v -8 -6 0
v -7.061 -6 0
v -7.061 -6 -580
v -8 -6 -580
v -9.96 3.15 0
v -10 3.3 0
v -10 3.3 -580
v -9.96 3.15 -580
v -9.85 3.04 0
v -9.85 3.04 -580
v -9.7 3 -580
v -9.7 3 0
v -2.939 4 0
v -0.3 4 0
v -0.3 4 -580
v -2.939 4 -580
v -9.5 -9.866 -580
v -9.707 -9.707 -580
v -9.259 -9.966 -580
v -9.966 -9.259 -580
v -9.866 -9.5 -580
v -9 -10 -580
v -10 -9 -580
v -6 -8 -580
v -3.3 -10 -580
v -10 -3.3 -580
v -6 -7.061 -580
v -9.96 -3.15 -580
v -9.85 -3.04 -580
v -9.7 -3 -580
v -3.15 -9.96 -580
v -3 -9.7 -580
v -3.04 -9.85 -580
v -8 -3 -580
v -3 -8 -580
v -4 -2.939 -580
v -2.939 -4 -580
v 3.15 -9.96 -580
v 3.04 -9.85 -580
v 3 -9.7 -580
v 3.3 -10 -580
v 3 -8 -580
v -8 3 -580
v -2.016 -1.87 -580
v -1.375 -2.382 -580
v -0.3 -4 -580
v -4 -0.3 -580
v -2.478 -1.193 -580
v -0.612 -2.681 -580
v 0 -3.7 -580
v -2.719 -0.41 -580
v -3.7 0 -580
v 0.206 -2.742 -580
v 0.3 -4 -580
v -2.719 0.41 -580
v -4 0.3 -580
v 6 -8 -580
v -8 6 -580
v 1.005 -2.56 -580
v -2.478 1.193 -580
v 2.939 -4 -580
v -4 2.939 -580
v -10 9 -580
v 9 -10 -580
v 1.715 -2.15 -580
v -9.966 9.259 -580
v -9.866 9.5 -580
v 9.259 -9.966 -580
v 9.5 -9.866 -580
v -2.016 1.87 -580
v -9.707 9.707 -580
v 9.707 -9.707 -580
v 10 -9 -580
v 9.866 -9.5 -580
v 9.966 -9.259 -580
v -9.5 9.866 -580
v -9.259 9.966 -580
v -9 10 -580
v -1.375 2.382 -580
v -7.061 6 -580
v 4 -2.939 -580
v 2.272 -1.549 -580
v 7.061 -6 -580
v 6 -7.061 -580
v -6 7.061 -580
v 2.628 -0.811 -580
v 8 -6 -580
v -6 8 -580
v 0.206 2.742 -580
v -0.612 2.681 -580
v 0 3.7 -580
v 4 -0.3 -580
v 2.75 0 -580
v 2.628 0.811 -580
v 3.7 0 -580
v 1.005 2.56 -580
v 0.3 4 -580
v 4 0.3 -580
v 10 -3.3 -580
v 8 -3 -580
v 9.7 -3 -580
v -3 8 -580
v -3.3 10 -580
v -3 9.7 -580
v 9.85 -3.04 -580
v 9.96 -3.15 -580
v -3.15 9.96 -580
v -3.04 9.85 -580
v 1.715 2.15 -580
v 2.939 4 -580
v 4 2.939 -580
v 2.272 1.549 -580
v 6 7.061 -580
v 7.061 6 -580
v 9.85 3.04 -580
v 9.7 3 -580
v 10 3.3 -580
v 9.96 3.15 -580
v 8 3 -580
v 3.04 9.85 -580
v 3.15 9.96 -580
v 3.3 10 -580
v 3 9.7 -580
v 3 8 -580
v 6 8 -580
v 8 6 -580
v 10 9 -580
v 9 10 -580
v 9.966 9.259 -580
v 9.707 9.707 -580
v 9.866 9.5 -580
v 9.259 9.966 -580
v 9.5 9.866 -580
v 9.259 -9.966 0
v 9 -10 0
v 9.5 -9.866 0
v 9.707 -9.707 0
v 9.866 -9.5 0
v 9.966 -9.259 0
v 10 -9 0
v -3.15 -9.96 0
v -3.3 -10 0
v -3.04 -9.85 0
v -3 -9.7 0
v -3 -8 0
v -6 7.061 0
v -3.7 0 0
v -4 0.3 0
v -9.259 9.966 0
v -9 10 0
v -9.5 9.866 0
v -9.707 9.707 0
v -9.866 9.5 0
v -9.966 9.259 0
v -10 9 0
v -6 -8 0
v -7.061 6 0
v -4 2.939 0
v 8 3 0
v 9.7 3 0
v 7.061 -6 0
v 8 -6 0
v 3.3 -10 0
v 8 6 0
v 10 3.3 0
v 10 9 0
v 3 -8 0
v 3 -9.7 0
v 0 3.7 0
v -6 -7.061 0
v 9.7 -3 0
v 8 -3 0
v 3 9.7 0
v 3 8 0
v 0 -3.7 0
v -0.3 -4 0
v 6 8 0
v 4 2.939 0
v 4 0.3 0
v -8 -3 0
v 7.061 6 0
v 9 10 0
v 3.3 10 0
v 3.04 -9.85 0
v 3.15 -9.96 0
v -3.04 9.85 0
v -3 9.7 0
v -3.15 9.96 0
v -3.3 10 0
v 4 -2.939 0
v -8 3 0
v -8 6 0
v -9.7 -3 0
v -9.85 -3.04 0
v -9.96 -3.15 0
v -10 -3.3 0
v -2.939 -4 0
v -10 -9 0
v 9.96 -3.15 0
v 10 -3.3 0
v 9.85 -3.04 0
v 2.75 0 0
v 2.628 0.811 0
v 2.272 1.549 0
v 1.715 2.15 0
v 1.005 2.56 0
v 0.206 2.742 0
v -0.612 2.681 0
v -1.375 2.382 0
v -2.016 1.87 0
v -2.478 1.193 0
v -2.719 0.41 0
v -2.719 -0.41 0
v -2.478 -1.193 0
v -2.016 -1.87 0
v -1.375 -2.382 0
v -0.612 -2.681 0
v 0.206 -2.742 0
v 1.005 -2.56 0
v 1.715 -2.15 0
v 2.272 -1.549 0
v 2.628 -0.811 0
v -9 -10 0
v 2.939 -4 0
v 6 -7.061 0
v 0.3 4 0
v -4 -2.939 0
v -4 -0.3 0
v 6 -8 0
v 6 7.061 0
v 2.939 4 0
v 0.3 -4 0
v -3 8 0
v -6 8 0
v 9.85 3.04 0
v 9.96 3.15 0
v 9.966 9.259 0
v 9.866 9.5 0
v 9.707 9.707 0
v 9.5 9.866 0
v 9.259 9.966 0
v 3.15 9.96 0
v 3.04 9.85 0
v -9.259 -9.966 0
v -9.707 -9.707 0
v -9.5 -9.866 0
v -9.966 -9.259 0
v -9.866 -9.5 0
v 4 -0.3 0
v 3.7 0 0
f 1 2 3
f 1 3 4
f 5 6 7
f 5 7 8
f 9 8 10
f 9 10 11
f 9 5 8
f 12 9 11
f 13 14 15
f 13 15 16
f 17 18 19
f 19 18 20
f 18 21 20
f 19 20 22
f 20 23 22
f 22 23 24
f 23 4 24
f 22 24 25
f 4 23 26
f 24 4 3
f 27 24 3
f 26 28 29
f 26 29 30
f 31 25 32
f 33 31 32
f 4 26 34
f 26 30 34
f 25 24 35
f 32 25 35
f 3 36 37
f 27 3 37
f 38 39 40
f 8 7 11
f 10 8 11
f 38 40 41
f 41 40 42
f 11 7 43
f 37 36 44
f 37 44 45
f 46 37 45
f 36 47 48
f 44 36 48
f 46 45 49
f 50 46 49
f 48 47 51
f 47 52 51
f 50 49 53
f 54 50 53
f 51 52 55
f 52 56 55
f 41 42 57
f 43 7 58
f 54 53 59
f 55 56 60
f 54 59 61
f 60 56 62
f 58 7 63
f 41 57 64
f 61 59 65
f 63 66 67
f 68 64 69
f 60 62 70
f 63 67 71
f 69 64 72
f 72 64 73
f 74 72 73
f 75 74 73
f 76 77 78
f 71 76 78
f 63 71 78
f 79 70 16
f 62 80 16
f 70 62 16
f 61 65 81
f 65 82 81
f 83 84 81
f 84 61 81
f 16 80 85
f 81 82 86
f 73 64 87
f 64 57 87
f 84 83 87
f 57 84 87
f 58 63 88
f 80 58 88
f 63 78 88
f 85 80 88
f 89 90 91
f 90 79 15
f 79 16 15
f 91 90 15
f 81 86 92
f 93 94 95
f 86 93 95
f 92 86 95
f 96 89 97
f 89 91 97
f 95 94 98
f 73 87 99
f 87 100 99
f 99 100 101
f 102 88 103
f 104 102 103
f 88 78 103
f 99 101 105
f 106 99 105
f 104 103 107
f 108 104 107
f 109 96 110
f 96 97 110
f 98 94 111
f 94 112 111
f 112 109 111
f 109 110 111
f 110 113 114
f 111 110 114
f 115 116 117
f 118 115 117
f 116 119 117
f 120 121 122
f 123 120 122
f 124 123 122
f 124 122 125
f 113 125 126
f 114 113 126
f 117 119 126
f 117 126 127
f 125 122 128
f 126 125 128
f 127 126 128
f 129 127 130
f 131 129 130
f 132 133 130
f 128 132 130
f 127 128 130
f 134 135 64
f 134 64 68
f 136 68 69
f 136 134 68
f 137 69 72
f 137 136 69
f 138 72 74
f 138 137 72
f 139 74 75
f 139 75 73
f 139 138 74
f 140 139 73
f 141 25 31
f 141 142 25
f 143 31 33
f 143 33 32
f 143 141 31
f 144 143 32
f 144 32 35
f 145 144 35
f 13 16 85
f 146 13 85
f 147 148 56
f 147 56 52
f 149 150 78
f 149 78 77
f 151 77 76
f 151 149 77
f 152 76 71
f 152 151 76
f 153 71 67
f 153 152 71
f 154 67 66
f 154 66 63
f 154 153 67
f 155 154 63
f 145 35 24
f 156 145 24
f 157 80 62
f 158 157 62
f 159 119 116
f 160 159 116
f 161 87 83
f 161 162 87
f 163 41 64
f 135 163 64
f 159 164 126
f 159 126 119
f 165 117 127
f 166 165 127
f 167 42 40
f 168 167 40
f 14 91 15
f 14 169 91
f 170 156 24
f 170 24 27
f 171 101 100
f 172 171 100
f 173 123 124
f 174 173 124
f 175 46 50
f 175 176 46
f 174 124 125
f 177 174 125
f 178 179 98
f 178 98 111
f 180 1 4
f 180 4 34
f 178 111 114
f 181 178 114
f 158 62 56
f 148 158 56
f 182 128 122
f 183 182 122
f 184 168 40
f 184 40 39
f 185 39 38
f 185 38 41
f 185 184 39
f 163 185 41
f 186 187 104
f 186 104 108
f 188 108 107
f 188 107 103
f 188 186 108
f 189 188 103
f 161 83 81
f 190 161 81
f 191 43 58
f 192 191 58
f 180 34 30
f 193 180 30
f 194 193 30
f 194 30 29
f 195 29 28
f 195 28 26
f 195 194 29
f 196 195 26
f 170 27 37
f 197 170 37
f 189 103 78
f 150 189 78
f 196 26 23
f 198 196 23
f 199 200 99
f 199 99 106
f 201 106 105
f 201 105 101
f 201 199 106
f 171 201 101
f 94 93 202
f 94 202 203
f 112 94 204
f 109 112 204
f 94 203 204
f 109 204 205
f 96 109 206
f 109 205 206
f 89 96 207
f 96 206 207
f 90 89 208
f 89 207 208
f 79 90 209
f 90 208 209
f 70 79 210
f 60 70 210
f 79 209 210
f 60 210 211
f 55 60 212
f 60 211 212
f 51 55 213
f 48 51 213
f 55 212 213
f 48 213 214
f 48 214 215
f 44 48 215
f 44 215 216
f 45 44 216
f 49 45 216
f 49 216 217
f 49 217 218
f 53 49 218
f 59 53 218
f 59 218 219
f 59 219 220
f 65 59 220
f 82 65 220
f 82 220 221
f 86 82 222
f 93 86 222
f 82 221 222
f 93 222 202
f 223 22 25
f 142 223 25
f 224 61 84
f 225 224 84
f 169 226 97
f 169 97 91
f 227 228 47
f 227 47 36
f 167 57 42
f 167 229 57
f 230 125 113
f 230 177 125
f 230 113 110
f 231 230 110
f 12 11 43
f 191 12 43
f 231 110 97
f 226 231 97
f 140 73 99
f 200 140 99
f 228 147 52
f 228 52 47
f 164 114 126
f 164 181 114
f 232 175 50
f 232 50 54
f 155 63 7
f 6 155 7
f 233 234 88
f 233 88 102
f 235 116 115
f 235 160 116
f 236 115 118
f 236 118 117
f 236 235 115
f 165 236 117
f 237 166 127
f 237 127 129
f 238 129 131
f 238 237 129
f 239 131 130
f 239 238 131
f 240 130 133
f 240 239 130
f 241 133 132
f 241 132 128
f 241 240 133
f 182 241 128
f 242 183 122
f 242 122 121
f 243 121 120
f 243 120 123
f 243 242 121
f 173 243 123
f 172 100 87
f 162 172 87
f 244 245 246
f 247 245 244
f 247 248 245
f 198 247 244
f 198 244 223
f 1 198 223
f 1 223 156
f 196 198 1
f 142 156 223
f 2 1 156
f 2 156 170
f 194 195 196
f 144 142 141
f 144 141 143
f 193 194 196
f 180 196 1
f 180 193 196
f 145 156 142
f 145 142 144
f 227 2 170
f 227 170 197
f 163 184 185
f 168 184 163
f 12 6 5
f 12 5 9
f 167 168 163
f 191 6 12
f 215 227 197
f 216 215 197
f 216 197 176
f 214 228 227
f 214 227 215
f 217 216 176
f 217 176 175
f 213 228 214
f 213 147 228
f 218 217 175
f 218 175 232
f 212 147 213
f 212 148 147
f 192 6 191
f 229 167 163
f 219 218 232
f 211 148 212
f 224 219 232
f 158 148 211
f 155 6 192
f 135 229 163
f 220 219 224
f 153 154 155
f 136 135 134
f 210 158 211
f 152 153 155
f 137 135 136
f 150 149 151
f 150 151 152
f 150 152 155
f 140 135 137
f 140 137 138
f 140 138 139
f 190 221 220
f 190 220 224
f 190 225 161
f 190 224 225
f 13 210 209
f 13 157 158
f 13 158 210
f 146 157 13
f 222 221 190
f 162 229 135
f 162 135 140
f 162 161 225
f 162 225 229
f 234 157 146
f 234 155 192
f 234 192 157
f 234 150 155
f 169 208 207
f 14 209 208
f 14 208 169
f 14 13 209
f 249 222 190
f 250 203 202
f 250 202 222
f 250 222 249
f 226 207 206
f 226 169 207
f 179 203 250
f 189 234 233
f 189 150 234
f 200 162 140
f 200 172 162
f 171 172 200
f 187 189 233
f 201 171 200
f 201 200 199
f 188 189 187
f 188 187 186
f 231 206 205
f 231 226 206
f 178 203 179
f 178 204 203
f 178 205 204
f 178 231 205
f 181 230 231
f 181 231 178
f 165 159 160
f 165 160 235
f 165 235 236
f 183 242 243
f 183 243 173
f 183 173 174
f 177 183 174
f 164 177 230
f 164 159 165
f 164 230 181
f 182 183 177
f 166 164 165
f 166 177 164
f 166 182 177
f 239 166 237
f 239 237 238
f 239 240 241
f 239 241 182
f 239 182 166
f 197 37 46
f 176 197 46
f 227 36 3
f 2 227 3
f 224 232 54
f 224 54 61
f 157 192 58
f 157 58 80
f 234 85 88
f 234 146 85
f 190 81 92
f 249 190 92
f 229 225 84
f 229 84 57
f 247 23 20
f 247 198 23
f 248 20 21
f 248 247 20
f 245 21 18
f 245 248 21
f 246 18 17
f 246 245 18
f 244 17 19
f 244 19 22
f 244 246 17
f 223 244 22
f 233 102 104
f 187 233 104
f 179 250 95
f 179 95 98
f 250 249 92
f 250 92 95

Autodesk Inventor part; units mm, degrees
ref_plane "YZ Plane" through (0, 0, 0) normal (1, 0, 0) x (0, 1, 0)
ref_plane "XZ Plane" through (0, 0, 0) normal (0, 1, 0) x (-1, 0, 0)
ref_plane "XY Plane" through (0, 0, 0) normal (0, 0, 1) x (1, 0, 0)
sketch "Sketch_5" plane through (0, 0, 0) normal (0, 0, 1) x (1, 0, 0)
  line L0 (-10, 9) -> (-10, 3.3)
  arc A0 (-10, 3.3) -> (-9.7, 3) centre (-9.7, 3.3) ccw
  line L1 (-9.7, 3) -> (-8, 3)
  line L2 (-8, 3) -> (-8, 6)
  line L3 (-8, 6) -> (-7.0607, 6)
  line L4 (-7.0607, 6) -> (-4, 2.9393)
  line L5 (-4, 2.9393) -> (-4, 0.3)
  line L6 (-4, 0.3) -> (-3.7, 0)
  line L7 (-3.7, 0) -> (-4, -0.3)
  line L8 (-4, -0.3) -> (-4, -2.9393)
  line L9 (-4, -2.9393) -> (-7.0607, -6)
  line L10 (-7.0607, -6) -> (-8, -6)
  line L11 (-8, -6) -> (-8, -3)
  line L12 (-8, -3) -> (-9.7, -3)
  arc A1 (-9.7, -3) -> (-10, -3.3) centre (-9.7, -3.3) ccw
  line L13 (-10, -3.3) -> (-10, -9)
  arc A2 (-10, -9) -> (-9, -10) centre (-9, -9) ccw
  line L14 (-9, -10) -> (-3.3, -10)
  arc A3 (-3.3, -10) -> (-3, -9.7) centre (-3.3, -9.7) ccw
  line L15 (-3, -9.7) -> (-3, -8)
  line L16 (-3, -8) -> (-6, -8)
  line L17 (-6, -8) -> (-6, -7.0607)
  line L18 (-6, -7.0607) -> (-2.9393, -4)
  line L19 (-2.9393, -4) -> (-0.3, -4)
  line L20 (-0.3, -4) -> (0, -3.7)
  line L21 (0, -3.7) -> (0.3, -4)
  line L22 (0.3, -4) -> (2.9393, -4)
  line L23 (2.9393, -4) -> (6, -7.0607)
  line L24 (6, -7.0607) -> (6, -8)
  line L25 (6, -8) -> (3, -8)
  line L26 (3, -8) -> (3, -9.7)
  arc A4 (3, -9.7) -> (3.3, -10) centre (3.3, -9.7) ccw
  line L27 (3.3, -10) -> (9, -10)
  arc A5 (9, -10) -> (10, -9) centre (9, -9) ccw
  line L28 (10, -9) -> (10, -3.3)
  arc A6 (10, -3.3) -> (9.7, -3) centre (9.7, -3.3) ccw
  line L29 (9.7, -3) -> (8, -3)
  line L30 (8, -3) -> (8, -6)
  line L31 (8, -6) -> (7.0607, -6)
  line L32 (7.0607, -6) -> (4, -2.9393)
  line L33 (4, -2.9393) -> (4, -0.3)
  line L34 (4, -0.3) -> (3.7, 0)
  line L35 (3.7, 0) -> (4, 0.3)
  line L36 (4, 0.3) -> (4, 2.9393)
  line L37 (4, 2.9393) -> (7.0607, 6)
  line L38 (7.0607, 6) -> (8, 6)
  line L39 (8, 6) -> (8, 3)
  line L40 (8, 3) -> (9.7, 3)
  arc A7 (9.7, 3) -> (10, 3.3) centre (9.7, 3.3) ccw
  line L41 (10, 3.3) -> (10, 9)
  arc A8 (10, 9) -> (9, 10) centre (9, 9) ccw
  line L42 (9, 10) -> (3.3, 10)
  arc A9 (3.3, 10) -> (3, 9.7) centre (3.3, 9.7) ccw
  line L43 (3, 9.7) -> (3, 8)
  line L44 (3, 8) -> (6, 8)
  line L45 (6, 8) -> (6, 7.0607)
  line L46 (6, 7.0607) -> (2.9393, 4)
  line L47 (2.9393, 4) -> (0.3, 4)
  line L48 (0.3, 4) -> (0, 3.7)
  line L49 (0, 3.7) -> (-0.3, 4)
  line L50 (-0.3, 4) -> (-2.9393, 4)
  line L51 (-2.9393, 4) -> (-6, 7.0607)
  line L52 (-6, 7.0607) -> (-6, 8)
  line L53 (-6, 8) -> (-3, 8)
  line L54 (-3, 8) -> (-3, 9.7)
  arc A10 (-3, 9.7) -> (-3.3, 10) centre (-3.3, 9.7) ccw
  line L55 (-3.3, 10) -> (-9, 10)
  arc A11 (-9, 10) -> (-10, 9) centre (-9, 9) ccw
  circle A12 centre (0, 0) radius 2.75
  dimension "d2" = 5.5
  dimension "d3" = 10
  dimension "d4" = 10
  dimension "d5" = 5.7
  dimension "d6" = 5.7
  dimension "d7" = 1.7
  dimension "d8" = 3
  dimension "d9" = 0.3
  dimension "d10" = 90
  dimension "d11" = 45
  dimension "d12" = 45
  dimension "d13" = 45
  dimension "d14" = 90
  dimension "d15" = 90
  dimension "d16" = 45
  dimension "d17" = 45
  dimension "d18" = 45
  dimension "d19" = 45
  dimension "d20" = 90
  dimension "d21" = 90
  dimension "d22" = 45
  dimension "d23" = 45
  dimension "d24" = 90
  dimension "d25" = 90
  dimension "d26" = 90
  dimension "d27" = 90
  dimension "d28" = 90
  dimension "d29" = 90
  dimension "d30" = 90
  dimension "d31" = 90
  dimension "d32" = 90
  dimension "d33" = 90
  dimension "d34" = 90
  dimension "d35" = 90
  dimension "d36" = 90
  dimension "d37" = 90
  dimension "d38" = 90
  dimension "d39" = 4
  dimension "d40" = 6
  dimension "d41" = 13
  dimension "d42" = 14
  dimension "d43" = 16
  dimension "d44" = 18
  dimension "d45" = 3
  dimension "d46" = 9
  dimension "d47" = 7
  dimension "d48" = 1
  dimension "d49" = 7
  dimension "d50" = 1.5
  dimension "d51" = 1.8663
  dimension "d52" = 3.3663
  dimension "d53" = 1.5
  dimension "d54" = 1.8663
  dimension "d55" = 3.3663
  dimension "d56" = 4
  dimension "d57" = 10.8187
  dimension "d58" = 1.9092
  dimension "d59" = 5
  dimension "d60" = 13
  dimension "d61" = 13
  dimension "d62" = 16.0513
  dimension "d63" = 3.3234
  dimension "d64" = 14
  dimension "d65" = 12.685
extrude "Extrusion1" add sketch "Sketch_5" against normal blind 580
properties part number "Perfil_Aluminio_20x20"
